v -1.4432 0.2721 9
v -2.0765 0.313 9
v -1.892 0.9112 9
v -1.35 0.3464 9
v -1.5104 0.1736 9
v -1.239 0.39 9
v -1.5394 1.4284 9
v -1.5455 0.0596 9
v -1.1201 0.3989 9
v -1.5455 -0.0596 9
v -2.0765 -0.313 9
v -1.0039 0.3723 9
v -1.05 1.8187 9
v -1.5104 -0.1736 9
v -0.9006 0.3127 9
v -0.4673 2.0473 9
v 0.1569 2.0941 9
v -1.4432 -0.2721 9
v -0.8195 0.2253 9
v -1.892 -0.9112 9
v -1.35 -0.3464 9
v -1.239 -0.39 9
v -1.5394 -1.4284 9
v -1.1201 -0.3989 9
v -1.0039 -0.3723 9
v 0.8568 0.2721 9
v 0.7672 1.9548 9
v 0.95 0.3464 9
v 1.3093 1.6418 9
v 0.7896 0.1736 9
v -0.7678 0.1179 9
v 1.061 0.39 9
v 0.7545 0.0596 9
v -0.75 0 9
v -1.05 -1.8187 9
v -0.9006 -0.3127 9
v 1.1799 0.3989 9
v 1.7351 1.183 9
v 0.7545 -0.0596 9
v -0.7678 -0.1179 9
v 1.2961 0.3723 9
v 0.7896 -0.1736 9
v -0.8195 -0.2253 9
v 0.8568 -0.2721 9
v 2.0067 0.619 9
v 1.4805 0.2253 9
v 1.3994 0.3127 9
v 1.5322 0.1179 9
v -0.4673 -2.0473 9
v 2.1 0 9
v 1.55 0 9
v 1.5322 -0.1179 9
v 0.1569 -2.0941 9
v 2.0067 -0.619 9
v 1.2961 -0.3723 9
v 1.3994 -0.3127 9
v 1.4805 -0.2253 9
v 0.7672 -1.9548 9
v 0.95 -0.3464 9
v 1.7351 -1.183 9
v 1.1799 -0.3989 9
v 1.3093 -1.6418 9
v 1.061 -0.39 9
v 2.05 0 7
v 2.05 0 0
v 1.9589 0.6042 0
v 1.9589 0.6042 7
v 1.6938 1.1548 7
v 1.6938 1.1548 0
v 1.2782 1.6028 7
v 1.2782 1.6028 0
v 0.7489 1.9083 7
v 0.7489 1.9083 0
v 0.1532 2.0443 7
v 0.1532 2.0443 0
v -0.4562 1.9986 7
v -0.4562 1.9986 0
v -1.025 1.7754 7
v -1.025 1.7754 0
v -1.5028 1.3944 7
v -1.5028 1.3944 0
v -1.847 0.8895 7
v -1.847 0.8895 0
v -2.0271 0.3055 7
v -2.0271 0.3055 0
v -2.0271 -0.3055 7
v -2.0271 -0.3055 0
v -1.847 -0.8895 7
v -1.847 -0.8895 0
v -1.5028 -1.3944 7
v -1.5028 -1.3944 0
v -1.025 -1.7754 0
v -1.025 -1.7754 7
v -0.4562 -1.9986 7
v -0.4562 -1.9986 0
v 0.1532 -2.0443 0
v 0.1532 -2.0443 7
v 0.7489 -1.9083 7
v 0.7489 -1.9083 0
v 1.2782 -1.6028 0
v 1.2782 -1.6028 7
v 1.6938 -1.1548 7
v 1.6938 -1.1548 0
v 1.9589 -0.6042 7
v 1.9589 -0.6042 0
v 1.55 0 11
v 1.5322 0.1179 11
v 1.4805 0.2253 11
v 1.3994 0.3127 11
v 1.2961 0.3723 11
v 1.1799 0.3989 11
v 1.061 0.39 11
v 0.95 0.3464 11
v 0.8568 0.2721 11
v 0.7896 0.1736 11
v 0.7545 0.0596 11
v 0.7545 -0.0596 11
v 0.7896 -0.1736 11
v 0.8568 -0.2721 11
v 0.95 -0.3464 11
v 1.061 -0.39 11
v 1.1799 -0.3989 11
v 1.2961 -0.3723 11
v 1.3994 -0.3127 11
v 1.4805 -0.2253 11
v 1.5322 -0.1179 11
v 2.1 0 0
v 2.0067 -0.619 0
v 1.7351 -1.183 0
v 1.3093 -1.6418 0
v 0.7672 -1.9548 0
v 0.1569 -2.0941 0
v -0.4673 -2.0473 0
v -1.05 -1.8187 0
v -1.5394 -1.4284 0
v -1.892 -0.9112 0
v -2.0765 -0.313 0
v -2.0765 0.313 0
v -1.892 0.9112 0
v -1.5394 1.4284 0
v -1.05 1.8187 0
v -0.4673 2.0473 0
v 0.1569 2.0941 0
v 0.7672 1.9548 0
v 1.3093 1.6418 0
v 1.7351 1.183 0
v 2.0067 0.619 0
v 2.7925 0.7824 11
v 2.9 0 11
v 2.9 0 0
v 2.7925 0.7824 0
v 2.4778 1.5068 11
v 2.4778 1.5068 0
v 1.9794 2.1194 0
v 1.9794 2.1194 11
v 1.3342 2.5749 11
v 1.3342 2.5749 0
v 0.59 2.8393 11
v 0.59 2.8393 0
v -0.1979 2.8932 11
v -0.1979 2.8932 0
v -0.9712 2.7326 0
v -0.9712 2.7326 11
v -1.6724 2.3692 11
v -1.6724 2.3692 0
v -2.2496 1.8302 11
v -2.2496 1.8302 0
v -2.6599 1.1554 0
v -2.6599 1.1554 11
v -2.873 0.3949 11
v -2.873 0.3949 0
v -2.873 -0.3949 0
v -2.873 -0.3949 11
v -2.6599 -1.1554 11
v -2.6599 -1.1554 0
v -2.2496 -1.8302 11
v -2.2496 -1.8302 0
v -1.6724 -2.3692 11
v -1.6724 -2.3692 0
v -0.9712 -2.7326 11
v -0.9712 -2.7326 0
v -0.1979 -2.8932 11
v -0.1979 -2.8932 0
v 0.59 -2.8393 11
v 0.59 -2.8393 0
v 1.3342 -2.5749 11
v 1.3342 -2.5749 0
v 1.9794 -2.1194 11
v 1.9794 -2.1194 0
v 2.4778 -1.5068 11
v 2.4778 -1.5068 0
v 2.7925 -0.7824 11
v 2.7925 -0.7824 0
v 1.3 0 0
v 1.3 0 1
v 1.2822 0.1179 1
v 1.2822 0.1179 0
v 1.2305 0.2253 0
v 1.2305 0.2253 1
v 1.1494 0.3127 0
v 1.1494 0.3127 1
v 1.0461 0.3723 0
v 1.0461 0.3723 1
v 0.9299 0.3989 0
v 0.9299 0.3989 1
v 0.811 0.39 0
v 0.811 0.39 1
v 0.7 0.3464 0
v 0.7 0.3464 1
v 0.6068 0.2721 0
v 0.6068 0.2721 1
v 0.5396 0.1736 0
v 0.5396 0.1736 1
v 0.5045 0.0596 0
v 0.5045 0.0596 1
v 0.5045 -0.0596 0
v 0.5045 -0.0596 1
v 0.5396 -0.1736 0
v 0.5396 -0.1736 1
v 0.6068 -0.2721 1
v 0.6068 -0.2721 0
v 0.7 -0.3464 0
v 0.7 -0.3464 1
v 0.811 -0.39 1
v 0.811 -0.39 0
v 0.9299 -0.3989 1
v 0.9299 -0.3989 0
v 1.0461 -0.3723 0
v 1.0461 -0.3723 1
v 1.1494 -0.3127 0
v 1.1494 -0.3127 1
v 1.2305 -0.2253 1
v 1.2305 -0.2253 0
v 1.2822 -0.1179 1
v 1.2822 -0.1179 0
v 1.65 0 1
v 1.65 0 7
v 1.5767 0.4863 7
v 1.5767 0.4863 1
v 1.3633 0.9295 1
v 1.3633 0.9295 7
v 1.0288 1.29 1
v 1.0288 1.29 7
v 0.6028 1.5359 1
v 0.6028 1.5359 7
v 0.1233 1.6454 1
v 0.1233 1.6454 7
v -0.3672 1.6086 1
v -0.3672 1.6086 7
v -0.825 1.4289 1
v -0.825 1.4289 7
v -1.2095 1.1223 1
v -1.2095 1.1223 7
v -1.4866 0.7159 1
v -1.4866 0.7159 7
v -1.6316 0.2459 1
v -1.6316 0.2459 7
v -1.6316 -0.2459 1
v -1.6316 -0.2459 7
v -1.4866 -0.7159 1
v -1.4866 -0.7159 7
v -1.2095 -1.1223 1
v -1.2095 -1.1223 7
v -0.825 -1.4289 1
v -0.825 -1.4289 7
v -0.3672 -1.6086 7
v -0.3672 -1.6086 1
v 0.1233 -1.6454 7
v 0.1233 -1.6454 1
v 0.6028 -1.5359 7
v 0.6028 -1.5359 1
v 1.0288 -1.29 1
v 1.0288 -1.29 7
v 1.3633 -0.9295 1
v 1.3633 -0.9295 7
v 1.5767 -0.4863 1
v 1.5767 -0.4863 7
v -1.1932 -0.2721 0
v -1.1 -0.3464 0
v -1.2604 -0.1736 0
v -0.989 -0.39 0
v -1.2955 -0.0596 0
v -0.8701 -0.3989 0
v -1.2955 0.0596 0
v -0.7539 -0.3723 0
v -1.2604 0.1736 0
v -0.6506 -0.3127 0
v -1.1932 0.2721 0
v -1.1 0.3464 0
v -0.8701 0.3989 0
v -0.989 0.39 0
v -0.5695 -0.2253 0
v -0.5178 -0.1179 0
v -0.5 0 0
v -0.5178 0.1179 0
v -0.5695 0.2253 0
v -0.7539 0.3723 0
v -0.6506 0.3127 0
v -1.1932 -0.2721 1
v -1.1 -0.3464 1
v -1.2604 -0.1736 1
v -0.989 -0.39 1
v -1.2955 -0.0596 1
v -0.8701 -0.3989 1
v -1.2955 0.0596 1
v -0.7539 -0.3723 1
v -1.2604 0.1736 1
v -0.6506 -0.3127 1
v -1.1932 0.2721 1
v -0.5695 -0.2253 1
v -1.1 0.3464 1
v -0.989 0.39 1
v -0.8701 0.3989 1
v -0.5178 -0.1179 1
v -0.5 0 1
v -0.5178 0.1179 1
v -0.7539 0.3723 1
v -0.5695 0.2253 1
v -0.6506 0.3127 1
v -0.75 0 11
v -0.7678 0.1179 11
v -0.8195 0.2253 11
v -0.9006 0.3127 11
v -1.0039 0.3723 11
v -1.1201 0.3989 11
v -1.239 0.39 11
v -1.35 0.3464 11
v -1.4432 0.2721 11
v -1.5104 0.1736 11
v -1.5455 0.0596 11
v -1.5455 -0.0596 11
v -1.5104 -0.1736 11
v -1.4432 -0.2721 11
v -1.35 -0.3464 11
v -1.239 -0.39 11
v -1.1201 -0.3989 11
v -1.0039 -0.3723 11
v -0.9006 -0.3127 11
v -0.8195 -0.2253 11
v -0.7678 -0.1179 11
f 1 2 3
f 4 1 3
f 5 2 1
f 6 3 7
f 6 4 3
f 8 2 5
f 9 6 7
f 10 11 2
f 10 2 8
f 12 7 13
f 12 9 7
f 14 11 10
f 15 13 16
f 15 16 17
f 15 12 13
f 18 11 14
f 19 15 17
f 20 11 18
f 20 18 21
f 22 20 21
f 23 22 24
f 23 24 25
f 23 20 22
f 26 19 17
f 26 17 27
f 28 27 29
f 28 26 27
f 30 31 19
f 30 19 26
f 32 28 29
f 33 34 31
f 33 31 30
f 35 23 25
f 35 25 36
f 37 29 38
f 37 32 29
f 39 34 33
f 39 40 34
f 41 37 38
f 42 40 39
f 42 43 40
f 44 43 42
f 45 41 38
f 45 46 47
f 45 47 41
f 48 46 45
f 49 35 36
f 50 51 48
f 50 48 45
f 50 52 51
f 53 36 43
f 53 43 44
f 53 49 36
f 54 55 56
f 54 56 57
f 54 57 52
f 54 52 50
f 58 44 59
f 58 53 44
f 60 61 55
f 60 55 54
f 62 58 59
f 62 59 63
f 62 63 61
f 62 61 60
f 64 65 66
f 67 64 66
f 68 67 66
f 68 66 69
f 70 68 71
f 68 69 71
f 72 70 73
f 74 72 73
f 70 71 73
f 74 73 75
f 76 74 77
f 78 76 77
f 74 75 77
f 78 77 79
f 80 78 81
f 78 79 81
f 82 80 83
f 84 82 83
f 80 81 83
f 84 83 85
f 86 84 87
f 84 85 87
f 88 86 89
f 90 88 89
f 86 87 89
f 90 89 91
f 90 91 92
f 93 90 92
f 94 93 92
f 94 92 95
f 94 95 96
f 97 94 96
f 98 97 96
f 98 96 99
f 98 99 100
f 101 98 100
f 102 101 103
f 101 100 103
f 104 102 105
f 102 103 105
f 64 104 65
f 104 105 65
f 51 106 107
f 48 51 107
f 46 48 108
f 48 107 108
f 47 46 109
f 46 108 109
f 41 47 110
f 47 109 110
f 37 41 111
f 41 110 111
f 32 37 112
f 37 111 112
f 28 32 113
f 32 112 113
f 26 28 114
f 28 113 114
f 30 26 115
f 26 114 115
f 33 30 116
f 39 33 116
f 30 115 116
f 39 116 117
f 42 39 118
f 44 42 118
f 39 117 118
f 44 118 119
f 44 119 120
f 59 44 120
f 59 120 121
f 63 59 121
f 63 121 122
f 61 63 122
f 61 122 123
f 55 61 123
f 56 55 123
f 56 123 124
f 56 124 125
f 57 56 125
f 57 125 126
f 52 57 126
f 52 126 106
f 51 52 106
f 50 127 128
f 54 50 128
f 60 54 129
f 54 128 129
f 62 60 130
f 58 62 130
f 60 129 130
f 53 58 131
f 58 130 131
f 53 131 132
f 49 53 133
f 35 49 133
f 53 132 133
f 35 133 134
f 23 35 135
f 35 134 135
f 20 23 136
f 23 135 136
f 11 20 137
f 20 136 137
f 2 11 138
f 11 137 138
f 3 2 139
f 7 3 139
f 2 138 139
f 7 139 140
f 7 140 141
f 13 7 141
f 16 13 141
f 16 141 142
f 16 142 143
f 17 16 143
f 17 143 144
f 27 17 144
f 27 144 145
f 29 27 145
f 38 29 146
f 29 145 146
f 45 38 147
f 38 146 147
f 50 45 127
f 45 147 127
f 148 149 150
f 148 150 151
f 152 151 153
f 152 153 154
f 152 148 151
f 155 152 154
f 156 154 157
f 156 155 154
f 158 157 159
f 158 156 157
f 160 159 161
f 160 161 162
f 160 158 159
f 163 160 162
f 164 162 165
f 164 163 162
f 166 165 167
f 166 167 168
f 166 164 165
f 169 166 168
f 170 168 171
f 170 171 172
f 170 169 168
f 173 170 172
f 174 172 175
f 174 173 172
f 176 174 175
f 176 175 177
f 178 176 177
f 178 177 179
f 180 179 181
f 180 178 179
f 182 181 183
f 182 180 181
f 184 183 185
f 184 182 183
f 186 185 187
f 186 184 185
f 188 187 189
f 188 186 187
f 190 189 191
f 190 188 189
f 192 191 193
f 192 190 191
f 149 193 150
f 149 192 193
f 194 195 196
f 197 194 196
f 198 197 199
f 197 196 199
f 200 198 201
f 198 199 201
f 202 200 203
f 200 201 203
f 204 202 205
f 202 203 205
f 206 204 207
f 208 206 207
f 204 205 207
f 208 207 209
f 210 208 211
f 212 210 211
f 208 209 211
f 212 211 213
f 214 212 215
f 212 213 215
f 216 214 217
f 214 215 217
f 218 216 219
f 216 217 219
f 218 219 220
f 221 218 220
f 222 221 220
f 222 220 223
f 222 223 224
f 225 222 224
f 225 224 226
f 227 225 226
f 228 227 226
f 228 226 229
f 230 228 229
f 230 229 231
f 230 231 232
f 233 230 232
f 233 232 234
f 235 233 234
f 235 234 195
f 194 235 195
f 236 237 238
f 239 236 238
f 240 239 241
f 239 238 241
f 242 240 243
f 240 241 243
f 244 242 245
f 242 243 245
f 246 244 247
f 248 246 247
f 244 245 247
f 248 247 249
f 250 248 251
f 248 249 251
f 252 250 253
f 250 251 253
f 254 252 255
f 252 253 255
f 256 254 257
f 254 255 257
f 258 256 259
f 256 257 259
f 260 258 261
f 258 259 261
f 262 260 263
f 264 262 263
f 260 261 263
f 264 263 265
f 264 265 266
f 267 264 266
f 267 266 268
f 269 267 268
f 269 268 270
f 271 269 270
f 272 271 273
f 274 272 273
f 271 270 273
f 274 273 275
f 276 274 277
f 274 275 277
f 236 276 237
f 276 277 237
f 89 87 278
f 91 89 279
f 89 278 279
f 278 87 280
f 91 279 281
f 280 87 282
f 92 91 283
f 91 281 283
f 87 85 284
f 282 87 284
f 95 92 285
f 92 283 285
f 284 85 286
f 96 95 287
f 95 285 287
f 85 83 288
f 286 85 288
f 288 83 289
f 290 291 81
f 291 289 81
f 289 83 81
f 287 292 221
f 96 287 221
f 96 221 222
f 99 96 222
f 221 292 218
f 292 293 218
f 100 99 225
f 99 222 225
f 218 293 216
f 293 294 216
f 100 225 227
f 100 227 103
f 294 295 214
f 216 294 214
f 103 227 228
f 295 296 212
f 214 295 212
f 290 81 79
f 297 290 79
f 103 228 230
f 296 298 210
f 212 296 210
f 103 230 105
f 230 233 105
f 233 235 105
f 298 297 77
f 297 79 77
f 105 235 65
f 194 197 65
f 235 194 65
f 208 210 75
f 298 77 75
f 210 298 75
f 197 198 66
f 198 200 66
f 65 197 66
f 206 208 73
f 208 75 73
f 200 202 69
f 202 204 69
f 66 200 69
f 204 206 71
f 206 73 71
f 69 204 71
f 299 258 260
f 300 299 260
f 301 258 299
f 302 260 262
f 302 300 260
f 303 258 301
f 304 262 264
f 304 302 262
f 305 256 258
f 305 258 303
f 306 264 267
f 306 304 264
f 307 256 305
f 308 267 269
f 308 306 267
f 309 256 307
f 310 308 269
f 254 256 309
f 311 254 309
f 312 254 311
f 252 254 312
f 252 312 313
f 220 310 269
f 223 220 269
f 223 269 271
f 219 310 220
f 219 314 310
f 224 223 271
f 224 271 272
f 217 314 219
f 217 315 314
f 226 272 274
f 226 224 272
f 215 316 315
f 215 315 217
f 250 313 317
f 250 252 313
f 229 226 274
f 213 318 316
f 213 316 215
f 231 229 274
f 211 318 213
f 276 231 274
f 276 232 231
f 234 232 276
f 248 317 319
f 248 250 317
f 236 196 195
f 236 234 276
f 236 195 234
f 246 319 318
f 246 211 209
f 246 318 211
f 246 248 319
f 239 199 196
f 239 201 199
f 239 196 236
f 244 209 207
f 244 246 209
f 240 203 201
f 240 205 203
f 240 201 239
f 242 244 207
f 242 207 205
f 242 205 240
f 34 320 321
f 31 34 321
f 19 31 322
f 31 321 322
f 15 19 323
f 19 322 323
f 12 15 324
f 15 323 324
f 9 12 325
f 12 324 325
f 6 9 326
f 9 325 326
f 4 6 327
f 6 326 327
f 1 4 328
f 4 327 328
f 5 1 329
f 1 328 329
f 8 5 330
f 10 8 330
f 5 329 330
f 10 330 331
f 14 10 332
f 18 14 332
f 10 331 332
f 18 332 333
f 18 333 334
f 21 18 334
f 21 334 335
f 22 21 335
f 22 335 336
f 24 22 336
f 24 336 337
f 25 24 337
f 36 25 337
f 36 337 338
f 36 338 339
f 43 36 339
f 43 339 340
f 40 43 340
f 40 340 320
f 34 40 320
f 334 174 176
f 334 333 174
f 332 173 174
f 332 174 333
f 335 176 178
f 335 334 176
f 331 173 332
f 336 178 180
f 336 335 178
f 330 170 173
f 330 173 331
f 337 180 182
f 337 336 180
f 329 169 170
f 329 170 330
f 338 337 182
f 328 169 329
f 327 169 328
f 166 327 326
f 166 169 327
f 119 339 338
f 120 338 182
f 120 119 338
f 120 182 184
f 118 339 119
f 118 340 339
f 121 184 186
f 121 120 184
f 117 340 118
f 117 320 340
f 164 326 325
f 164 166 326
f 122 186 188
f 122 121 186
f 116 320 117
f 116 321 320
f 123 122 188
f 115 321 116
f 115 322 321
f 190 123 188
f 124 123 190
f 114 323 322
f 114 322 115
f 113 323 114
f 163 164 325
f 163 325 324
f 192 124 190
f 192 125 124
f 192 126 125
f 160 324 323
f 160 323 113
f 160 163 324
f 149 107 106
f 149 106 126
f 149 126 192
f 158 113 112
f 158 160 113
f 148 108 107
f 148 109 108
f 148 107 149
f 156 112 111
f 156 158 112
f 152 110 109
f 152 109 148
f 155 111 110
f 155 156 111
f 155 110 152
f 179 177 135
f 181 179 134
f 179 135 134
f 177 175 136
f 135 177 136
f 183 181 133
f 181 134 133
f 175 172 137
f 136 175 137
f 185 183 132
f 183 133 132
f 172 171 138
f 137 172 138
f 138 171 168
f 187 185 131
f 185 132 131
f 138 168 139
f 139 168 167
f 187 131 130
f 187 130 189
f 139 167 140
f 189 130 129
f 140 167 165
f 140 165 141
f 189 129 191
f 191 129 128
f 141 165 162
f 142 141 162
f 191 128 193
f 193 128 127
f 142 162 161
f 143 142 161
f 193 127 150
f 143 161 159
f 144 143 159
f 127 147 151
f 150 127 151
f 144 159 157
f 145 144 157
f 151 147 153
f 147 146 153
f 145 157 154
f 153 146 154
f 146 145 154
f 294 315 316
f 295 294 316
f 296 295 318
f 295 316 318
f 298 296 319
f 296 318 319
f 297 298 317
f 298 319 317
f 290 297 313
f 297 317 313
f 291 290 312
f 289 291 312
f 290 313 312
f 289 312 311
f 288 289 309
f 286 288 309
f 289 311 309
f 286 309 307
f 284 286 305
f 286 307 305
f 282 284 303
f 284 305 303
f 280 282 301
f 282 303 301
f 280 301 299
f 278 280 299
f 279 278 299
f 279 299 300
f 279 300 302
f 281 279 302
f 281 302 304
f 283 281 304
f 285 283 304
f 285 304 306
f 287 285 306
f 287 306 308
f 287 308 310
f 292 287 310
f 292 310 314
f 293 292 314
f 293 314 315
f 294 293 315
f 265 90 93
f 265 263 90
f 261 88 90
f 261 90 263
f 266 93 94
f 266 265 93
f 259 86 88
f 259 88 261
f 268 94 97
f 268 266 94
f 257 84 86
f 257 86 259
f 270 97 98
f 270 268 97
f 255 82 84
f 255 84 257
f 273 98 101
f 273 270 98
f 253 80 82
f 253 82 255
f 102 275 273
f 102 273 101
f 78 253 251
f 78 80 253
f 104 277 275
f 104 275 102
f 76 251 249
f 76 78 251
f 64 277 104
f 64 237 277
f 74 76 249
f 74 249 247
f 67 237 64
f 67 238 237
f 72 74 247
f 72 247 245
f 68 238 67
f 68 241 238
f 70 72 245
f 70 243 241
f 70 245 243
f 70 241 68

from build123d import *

# Parameters (mm, degrees)
SKETCH_R        = 2.05
PAD_DEPTH       = 7
SKETCH001_R     = 1.65
POCKET_DEPTH    = 6
SKETCH002_R     = 0.4
POCKET001_DEPTH = 1.001
SKETCH003_R     = 2.9
PAD001_DEPTH    = 11
SKETCH004_R     = 2.1
POCKET002_DEPTH = 9
SKETCH005_R     = 0.4
POCKET003_DEPTH = 11.001


with BuildPart() as ldr_housing:
    # Sketch → Pad (new body)
    with BuildSketch(Plane.XY):
        Circle(SKETCH_R)
    extrude(amount=PAD_DEPTH)

    # Sketch001 (on Face3 of Pad) → Pocket (cut)
    with BuildSketch(Plane.XY.offset(7)):
        Circle(SKETCH001_R)
    extrude(amount=-POCKET_DEPTH, mode=Mode.SUBTRACT)

    # Sketch002 (on Face5 of Pocket) → Pocket001 (cut, through all)
    with BuildSketch(Plane.XY.offset(1)):
        with Locations((-0.9, 0)):
            Circle(SKETCH002_R)
        with Locations((0.9, 0)):
            Circle(SKETCH002_R)
    extrude(amount=-POCKET001_DEPTH, mode=Mode.SUBTRACT)


with BuildPart() as led_housing:
    # Sketch003 (on DatumPlane) → Pad001 (new body)
    with BuildSketch(Plane.XY.offset(11)):
        Circle(SKETCH003_R)
    extrude(amount=-PAD001_DEPTH)

    # Sketch004 (on Face3 of Pad001) → Pocket002 (cut)
    with BuildSketch(Plane(origin=(0, 0, 0), x_dir=(1, 0, 0), z_dir=(0, 0, -1))):
        Circle(SKETCH004_R)
    extrude(amount=-POCKET002_DEPTH, mode=Mode.SUBTRACT)

    # Sketch005 (on Face2 of Pocket002) → Pocket003 (cut, through all)
    with BuildSketch(Plane.XY.offset(11)):
        with Locations((-1.15, 0)):
            Circle(SKETCH005_R)
        with Locations((1.15, 0)):
            Circle(SKETCH005_R)
    extrude(amount=-POCKET003_DEPTH, mode=Mode.SUBTRACT)


solid = Compound([ldr_housing.part, led_housing.part])
